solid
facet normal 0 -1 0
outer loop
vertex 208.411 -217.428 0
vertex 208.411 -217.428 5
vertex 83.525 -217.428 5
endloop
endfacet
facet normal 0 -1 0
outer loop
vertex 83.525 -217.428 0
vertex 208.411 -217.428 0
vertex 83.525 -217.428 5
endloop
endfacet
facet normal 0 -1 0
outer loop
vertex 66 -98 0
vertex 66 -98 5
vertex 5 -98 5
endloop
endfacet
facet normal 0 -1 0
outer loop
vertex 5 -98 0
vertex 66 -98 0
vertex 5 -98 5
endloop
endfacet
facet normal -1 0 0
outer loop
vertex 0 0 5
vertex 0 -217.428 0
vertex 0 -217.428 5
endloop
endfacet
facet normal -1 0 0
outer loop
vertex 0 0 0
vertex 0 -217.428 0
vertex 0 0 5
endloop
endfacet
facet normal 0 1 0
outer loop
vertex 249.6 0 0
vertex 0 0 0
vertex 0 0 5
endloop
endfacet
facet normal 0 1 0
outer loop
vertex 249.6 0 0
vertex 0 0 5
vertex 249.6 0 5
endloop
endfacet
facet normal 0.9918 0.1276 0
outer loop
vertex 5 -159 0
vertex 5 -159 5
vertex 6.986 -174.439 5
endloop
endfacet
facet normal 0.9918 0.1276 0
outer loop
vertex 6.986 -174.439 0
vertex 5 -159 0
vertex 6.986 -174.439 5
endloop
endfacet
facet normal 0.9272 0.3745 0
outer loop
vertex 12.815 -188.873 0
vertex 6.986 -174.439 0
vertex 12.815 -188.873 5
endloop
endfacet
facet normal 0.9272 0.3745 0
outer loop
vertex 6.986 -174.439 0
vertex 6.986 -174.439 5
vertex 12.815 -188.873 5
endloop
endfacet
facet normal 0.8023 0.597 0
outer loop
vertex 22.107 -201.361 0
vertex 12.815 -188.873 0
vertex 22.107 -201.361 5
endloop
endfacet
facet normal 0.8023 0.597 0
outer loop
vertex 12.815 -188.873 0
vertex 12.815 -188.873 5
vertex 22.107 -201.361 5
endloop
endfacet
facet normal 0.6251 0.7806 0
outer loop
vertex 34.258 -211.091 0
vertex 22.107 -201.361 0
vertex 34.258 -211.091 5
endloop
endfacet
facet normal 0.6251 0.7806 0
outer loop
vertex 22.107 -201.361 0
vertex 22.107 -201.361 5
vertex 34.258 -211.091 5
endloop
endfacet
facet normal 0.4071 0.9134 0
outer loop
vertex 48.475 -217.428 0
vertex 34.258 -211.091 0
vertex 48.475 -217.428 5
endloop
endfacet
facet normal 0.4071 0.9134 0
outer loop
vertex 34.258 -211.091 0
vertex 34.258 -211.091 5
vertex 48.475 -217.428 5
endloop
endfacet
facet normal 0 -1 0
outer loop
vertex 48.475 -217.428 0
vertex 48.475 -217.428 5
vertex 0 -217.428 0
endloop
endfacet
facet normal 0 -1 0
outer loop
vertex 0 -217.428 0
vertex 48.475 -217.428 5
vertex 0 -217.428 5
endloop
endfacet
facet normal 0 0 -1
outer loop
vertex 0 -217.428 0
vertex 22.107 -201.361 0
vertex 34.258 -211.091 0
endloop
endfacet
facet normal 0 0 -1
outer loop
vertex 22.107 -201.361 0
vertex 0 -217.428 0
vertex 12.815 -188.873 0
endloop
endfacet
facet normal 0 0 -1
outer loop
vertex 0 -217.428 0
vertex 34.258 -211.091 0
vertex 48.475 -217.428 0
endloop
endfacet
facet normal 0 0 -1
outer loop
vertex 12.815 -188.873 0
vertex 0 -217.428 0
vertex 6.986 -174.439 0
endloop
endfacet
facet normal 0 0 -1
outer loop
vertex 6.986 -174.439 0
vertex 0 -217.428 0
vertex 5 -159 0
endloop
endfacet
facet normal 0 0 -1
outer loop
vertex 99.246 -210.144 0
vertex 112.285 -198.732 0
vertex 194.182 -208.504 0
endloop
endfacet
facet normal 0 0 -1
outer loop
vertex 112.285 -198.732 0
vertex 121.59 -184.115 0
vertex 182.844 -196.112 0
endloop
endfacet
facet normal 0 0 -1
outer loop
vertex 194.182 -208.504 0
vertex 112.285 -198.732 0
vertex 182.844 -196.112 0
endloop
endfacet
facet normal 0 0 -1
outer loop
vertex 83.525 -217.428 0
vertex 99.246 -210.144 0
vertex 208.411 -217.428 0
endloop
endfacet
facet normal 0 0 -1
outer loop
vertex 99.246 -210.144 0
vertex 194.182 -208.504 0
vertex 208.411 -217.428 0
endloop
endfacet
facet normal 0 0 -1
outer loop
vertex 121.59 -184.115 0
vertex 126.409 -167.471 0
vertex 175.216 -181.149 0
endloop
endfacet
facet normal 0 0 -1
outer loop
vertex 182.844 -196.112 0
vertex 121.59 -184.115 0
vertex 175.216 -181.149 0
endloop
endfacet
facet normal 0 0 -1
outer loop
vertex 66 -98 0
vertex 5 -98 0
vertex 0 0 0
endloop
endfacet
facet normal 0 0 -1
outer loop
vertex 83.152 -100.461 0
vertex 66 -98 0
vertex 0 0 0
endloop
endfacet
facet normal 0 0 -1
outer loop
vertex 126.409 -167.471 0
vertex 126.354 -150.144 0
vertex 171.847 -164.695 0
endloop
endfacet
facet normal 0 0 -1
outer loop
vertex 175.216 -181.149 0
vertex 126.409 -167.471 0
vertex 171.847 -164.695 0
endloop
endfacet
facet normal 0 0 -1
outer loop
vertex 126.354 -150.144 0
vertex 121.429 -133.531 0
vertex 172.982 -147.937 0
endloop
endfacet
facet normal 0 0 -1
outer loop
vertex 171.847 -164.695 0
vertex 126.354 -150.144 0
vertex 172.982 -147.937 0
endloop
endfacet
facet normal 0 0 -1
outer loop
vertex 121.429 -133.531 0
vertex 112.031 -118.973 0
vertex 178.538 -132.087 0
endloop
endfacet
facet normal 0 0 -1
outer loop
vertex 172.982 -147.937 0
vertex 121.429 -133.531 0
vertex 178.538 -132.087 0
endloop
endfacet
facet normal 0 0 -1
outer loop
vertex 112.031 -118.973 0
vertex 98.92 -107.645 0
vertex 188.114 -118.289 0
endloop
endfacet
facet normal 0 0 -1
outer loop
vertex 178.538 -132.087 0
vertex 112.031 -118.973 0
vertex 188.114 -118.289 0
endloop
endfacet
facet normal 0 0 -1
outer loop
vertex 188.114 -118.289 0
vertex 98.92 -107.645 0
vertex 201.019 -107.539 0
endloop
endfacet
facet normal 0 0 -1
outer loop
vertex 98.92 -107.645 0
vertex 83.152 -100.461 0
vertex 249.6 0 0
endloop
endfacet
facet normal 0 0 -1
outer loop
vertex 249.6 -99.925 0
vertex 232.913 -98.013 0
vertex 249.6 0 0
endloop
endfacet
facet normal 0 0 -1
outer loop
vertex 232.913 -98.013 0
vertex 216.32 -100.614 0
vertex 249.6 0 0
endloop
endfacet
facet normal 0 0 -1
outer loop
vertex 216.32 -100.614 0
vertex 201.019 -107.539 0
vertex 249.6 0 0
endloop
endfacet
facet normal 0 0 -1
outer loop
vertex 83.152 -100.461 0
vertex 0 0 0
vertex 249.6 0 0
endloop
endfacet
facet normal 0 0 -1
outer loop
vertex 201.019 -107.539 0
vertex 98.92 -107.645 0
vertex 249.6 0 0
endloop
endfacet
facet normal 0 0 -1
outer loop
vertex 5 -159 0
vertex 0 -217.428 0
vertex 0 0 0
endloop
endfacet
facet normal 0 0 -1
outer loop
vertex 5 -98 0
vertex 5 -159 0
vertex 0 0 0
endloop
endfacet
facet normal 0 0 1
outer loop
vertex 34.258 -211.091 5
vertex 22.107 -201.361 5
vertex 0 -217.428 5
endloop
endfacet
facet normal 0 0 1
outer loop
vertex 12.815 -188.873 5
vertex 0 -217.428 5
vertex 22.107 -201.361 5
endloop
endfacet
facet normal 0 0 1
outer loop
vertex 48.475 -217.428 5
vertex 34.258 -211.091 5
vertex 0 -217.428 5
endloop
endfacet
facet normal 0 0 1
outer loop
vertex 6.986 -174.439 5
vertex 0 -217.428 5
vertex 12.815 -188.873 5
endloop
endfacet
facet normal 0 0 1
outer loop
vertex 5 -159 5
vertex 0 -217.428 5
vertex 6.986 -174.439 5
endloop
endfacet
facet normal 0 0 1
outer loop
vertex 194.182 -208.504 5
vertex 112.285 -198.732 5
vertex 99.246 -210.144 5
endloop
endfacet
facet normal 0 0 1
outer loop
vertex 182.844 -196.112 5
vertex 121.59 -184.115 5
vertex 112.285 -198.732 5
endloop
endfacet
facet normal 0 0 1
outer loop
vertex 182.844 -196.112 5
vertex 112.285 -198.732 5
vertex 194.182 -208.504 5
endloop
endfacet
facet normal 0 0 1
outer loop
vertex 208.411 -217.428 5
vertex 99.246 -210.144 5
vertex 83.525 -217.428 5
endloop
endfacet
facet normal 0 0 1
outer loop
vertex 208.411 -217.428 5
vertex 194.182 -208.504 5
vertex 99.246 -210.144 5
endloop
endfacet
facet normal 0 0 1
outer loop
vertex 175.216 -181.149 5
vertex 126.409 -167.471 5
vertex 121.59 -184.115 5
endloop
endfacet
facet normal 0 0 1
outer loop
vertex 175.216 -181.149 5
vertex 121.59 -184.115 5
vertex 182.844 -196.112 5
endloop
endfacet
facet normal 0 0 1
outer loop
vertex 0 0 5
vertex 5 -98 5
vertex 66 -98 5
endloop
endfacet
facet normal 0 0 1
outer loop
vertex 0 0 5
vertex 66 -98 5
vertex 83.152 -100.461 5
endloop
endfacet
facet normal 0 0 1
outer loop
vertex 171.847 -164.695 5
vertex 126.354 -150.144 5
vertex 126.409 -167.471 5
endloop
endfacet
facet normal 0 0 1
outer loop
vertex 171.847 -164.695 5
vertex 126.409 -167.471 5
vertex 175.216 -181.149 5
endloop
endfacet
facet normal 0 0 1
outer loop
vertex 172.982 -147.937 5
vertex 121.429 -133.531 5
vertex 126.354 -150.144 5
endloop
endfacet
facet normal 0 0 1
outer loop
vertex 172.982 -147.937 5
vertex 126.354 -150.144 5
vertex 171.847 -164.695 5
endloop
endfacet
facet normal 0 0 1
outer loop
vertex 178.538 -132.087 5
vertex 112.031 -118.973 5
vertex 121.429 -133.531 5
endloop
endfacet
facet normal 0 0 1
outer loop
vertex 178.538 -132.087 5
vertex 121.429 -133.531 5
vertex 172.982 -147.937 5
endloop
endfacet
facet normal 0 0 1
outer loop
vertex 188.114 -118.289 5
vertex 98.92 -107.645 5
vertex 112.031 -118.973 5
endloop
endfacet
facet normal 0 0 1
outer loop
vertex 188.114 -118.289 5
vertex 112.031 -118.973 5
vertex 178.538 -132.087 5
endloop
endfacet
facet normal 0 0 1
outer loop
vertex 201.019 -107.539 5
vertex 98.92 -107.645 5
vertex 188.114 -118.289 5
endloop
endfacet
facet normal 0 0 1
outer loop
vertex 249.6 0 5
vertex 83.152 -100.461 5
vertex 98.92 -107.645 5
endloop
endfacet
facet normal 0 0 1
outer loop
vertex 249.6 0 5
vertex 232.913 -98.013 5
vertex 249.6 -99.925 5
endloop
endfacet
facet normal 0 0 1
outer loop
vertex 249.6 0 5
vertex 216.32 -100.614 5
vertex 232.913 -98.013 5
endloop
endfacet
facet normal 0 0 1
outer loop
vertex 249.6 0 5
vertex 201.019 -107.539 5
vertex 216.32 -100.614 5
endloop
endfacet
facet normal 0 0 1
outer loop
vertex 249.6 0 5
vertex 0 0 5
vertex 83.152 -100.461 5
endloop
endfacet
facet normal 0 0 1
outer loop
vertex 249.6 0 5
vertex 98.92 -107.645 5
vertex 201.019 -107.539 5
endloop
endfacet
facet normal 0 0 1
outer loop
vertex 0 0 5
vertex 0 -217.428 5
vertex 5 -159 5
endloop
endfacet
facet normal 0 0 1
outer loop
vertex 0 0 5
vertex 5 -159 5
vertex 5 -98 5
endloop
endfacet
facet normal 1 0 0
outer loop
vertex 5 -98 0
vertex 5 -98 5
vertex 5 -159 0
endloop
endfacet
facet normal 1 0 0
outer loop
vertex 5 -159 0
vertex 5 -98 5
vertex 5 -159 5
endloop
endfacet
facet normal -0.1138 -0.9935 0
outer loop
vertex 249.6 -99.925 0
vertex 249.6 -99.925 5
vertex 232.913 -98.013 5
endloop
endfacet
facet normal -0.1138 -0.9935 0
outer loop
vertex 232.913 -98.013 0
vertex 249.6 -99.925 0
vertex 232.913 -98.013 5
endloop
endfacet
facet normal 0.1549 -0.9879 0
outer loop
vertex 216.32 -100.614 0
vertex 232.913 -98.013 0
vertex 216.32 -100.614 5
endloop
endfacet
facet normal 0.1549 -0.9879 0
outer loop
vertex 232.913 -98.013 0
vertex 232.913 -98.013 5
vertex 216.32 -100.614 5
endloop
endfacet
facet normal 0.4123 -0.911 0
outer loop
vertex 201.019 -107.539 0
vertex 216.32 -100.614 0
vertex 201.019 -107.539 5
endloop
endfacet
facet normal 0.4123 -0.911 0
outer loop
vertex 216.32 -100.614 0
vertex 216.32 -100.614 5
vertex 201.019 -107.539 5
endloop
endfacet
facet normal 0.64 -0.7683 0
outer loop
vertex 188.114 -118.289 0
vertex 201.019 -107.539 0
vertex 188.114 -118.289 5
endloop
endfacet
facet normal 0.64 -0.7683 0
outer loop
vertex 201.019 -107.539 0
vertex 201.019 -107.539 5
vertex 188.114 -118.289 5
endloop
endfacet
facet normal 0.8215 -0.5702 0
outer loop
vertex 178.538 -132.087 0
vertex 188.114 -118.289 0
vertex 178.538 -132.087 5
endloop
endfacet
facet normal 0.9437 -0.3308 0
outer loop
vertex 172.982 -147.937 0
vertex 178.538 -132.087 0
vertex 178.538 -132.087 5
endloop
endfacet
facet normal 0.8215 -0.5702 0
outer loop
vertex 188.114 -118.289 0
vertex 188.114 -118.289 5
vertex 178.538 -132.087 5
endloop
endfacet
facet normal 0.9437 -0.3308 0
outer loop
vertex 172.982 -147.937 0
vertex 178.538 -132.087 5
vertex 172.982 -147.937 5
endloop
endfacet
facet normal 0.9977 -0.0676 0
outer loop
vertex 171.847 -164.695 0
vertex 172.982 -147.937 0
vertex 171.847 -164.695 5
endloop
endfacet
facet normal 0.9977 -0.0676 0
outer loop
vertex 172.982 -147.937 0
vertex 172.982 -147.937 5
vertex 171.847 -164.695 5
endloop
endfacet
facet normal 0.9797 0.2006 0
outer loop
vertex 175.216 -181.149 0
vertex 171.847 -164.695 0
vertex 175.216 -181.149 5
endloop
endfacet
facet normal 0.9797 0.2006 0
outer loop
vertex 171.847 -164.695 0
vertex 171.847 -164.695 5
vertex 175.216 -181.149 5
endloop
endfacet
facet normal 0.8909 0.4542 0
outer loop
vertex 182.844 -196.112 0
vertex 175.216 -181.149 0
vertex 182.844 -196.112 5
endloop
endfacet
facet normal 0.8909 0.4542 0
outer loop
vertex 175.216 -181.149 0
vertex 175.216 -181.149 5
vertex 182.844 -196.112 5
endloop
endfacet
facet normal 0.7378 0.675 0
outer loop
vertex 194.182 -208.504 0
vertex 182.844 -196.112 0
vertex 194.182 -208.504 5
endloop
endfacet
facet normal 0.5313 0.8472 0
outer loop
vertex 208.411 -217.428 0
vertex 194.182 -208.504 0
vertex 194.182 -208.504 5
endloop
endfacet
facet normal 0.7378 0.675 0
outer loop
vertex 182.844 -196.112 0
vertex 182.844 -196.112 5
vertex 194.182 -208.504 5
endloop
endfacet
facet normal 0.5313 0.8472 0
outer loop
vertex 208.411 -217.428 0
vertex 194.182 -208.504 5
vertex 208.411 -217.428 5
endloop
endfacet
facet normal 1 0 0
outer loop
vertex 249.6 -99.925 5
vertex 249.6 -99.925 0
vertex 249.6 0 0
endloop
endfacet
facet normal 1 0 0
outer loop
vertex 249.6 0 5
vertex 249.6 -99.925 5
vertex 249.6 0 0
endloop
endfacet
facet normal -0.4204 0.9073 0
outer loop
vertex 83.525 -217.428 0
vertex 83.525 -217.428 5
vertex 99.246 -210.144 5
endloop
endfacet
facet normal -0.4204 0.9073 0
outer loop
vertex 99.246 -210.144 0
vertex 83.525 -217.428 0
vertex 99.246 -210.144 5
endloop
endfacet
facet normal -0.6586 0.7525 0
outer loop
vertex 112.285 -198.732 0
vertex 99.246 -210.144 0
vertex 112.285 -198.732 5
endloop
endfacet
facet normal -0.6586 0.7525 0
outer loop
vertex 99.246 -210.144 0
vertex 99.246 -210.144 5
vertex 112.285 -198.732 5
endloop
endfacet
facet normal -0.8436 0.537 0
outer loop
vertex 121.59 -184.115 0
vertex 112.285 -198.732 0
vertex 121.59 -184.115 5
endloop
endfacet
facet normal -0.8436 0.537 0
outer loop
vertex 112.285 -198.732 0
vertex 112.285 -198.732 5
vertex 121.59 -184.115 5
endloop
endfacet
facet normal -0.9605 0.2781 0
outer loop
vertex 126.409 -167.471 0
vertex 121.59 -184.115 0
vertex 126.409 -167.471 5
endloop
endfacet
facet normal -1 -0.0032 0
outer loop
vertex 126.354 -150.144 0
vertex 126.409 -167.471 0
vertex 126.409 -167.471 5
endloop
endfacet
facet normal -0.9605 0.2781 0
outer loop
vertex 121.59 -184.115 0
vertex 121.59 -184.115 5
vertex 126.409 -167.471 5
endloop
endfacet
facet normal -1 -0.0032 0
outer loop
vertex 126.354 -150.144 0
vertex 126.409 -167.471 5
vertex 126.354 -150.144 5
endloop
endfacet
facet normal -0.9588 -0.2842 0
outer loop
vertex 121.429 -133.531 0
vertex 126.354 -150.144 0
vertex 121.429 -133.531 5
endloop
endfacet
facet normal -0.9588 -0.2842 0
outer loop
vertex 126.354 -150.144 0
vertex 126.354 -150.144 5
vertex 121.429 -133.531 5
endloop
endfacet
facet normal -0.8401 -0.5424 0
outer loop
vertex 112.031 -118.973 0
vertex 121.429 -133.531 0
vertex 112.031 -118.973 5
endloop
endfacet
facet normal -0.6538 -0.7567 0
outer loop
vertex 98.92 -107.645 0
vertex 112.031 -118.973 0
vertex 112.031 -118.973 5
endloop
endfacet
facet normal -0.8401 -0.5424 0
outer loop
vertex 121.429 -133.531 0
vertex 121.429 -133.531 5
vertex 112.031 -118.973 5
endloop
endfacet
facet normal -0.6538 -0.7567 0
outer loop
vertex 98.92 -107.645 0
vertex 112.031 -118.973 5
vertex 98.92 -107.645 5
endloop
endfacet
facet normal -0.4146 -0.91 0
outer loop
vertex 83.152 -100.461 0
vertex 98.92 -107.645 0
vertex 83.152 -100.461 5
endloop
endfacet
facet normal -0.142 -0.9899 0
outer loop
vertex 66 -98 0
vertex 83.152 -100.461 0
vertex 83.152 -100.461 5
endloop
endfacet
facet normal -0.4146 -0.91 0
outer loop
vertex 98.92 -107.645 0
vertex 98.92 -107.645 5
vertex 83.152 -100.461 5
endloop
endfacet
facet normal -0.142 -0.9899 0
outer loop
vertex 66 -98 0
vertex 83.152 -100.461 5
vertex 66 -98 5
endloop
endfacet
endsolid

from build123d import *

# Parameters (mm, degrees)
SKETCH1_W           = 249.6
SKETCH1_H           = 267.4
BOSS_EXTRUDE1_DEPTH = 5
CUT_EXTRUDE3_DEPTH  = 6


with BuildPart() as part:
    # Sketch1 → Boss-Extrude1 (new body)
    with BuildSketch(Plane.XY):
        with Locations((124.8, -133.7)):
            Rectangle(SKETCH1_W, SKETCH1_H)
    extrude(amount=BOSS_EXTRUDE1_DEPTH)

    # Sketch5 → Cut-Extrude3 (cut, through all)
    with BuildSketch(Plane.XY.offset(5)):
        with BuildLine():
            Line((124.8, -267.4), (249.6, -267.4))
            Line((249.6, -267.4), (249.6, -99.925464159))
            ThreePointArc((249.6, -99.925464159), (175.224742578, -139.824828971), (208.410715021, -217.428498098))
            Line((208.410715021, -217.428498098), (83.524571607, -217.428498098))
            ThreePointArc((83.524571607, -217.428498098), (126.353700731, -150.143883017), (66, -98))
            Line((66, -98), (5, -98))
            Line((5, -98), (5, -159))
            ThreePointArc((5, -159), (17.061268569, -195.414290683), (48.475428393, -217.428498098))
            Line((48.475428393, -217.428498098), (0, -217.428498098))
            Line((0, -217.428498098), (0, -267.4))
            Line((0, -267.4), (124.8, -267.4))
        make_face()
    extrude(amount=-CUT_EXTRUDE3_DEPTH, mode=Mode.SUBTRACT)


solid = part.part
